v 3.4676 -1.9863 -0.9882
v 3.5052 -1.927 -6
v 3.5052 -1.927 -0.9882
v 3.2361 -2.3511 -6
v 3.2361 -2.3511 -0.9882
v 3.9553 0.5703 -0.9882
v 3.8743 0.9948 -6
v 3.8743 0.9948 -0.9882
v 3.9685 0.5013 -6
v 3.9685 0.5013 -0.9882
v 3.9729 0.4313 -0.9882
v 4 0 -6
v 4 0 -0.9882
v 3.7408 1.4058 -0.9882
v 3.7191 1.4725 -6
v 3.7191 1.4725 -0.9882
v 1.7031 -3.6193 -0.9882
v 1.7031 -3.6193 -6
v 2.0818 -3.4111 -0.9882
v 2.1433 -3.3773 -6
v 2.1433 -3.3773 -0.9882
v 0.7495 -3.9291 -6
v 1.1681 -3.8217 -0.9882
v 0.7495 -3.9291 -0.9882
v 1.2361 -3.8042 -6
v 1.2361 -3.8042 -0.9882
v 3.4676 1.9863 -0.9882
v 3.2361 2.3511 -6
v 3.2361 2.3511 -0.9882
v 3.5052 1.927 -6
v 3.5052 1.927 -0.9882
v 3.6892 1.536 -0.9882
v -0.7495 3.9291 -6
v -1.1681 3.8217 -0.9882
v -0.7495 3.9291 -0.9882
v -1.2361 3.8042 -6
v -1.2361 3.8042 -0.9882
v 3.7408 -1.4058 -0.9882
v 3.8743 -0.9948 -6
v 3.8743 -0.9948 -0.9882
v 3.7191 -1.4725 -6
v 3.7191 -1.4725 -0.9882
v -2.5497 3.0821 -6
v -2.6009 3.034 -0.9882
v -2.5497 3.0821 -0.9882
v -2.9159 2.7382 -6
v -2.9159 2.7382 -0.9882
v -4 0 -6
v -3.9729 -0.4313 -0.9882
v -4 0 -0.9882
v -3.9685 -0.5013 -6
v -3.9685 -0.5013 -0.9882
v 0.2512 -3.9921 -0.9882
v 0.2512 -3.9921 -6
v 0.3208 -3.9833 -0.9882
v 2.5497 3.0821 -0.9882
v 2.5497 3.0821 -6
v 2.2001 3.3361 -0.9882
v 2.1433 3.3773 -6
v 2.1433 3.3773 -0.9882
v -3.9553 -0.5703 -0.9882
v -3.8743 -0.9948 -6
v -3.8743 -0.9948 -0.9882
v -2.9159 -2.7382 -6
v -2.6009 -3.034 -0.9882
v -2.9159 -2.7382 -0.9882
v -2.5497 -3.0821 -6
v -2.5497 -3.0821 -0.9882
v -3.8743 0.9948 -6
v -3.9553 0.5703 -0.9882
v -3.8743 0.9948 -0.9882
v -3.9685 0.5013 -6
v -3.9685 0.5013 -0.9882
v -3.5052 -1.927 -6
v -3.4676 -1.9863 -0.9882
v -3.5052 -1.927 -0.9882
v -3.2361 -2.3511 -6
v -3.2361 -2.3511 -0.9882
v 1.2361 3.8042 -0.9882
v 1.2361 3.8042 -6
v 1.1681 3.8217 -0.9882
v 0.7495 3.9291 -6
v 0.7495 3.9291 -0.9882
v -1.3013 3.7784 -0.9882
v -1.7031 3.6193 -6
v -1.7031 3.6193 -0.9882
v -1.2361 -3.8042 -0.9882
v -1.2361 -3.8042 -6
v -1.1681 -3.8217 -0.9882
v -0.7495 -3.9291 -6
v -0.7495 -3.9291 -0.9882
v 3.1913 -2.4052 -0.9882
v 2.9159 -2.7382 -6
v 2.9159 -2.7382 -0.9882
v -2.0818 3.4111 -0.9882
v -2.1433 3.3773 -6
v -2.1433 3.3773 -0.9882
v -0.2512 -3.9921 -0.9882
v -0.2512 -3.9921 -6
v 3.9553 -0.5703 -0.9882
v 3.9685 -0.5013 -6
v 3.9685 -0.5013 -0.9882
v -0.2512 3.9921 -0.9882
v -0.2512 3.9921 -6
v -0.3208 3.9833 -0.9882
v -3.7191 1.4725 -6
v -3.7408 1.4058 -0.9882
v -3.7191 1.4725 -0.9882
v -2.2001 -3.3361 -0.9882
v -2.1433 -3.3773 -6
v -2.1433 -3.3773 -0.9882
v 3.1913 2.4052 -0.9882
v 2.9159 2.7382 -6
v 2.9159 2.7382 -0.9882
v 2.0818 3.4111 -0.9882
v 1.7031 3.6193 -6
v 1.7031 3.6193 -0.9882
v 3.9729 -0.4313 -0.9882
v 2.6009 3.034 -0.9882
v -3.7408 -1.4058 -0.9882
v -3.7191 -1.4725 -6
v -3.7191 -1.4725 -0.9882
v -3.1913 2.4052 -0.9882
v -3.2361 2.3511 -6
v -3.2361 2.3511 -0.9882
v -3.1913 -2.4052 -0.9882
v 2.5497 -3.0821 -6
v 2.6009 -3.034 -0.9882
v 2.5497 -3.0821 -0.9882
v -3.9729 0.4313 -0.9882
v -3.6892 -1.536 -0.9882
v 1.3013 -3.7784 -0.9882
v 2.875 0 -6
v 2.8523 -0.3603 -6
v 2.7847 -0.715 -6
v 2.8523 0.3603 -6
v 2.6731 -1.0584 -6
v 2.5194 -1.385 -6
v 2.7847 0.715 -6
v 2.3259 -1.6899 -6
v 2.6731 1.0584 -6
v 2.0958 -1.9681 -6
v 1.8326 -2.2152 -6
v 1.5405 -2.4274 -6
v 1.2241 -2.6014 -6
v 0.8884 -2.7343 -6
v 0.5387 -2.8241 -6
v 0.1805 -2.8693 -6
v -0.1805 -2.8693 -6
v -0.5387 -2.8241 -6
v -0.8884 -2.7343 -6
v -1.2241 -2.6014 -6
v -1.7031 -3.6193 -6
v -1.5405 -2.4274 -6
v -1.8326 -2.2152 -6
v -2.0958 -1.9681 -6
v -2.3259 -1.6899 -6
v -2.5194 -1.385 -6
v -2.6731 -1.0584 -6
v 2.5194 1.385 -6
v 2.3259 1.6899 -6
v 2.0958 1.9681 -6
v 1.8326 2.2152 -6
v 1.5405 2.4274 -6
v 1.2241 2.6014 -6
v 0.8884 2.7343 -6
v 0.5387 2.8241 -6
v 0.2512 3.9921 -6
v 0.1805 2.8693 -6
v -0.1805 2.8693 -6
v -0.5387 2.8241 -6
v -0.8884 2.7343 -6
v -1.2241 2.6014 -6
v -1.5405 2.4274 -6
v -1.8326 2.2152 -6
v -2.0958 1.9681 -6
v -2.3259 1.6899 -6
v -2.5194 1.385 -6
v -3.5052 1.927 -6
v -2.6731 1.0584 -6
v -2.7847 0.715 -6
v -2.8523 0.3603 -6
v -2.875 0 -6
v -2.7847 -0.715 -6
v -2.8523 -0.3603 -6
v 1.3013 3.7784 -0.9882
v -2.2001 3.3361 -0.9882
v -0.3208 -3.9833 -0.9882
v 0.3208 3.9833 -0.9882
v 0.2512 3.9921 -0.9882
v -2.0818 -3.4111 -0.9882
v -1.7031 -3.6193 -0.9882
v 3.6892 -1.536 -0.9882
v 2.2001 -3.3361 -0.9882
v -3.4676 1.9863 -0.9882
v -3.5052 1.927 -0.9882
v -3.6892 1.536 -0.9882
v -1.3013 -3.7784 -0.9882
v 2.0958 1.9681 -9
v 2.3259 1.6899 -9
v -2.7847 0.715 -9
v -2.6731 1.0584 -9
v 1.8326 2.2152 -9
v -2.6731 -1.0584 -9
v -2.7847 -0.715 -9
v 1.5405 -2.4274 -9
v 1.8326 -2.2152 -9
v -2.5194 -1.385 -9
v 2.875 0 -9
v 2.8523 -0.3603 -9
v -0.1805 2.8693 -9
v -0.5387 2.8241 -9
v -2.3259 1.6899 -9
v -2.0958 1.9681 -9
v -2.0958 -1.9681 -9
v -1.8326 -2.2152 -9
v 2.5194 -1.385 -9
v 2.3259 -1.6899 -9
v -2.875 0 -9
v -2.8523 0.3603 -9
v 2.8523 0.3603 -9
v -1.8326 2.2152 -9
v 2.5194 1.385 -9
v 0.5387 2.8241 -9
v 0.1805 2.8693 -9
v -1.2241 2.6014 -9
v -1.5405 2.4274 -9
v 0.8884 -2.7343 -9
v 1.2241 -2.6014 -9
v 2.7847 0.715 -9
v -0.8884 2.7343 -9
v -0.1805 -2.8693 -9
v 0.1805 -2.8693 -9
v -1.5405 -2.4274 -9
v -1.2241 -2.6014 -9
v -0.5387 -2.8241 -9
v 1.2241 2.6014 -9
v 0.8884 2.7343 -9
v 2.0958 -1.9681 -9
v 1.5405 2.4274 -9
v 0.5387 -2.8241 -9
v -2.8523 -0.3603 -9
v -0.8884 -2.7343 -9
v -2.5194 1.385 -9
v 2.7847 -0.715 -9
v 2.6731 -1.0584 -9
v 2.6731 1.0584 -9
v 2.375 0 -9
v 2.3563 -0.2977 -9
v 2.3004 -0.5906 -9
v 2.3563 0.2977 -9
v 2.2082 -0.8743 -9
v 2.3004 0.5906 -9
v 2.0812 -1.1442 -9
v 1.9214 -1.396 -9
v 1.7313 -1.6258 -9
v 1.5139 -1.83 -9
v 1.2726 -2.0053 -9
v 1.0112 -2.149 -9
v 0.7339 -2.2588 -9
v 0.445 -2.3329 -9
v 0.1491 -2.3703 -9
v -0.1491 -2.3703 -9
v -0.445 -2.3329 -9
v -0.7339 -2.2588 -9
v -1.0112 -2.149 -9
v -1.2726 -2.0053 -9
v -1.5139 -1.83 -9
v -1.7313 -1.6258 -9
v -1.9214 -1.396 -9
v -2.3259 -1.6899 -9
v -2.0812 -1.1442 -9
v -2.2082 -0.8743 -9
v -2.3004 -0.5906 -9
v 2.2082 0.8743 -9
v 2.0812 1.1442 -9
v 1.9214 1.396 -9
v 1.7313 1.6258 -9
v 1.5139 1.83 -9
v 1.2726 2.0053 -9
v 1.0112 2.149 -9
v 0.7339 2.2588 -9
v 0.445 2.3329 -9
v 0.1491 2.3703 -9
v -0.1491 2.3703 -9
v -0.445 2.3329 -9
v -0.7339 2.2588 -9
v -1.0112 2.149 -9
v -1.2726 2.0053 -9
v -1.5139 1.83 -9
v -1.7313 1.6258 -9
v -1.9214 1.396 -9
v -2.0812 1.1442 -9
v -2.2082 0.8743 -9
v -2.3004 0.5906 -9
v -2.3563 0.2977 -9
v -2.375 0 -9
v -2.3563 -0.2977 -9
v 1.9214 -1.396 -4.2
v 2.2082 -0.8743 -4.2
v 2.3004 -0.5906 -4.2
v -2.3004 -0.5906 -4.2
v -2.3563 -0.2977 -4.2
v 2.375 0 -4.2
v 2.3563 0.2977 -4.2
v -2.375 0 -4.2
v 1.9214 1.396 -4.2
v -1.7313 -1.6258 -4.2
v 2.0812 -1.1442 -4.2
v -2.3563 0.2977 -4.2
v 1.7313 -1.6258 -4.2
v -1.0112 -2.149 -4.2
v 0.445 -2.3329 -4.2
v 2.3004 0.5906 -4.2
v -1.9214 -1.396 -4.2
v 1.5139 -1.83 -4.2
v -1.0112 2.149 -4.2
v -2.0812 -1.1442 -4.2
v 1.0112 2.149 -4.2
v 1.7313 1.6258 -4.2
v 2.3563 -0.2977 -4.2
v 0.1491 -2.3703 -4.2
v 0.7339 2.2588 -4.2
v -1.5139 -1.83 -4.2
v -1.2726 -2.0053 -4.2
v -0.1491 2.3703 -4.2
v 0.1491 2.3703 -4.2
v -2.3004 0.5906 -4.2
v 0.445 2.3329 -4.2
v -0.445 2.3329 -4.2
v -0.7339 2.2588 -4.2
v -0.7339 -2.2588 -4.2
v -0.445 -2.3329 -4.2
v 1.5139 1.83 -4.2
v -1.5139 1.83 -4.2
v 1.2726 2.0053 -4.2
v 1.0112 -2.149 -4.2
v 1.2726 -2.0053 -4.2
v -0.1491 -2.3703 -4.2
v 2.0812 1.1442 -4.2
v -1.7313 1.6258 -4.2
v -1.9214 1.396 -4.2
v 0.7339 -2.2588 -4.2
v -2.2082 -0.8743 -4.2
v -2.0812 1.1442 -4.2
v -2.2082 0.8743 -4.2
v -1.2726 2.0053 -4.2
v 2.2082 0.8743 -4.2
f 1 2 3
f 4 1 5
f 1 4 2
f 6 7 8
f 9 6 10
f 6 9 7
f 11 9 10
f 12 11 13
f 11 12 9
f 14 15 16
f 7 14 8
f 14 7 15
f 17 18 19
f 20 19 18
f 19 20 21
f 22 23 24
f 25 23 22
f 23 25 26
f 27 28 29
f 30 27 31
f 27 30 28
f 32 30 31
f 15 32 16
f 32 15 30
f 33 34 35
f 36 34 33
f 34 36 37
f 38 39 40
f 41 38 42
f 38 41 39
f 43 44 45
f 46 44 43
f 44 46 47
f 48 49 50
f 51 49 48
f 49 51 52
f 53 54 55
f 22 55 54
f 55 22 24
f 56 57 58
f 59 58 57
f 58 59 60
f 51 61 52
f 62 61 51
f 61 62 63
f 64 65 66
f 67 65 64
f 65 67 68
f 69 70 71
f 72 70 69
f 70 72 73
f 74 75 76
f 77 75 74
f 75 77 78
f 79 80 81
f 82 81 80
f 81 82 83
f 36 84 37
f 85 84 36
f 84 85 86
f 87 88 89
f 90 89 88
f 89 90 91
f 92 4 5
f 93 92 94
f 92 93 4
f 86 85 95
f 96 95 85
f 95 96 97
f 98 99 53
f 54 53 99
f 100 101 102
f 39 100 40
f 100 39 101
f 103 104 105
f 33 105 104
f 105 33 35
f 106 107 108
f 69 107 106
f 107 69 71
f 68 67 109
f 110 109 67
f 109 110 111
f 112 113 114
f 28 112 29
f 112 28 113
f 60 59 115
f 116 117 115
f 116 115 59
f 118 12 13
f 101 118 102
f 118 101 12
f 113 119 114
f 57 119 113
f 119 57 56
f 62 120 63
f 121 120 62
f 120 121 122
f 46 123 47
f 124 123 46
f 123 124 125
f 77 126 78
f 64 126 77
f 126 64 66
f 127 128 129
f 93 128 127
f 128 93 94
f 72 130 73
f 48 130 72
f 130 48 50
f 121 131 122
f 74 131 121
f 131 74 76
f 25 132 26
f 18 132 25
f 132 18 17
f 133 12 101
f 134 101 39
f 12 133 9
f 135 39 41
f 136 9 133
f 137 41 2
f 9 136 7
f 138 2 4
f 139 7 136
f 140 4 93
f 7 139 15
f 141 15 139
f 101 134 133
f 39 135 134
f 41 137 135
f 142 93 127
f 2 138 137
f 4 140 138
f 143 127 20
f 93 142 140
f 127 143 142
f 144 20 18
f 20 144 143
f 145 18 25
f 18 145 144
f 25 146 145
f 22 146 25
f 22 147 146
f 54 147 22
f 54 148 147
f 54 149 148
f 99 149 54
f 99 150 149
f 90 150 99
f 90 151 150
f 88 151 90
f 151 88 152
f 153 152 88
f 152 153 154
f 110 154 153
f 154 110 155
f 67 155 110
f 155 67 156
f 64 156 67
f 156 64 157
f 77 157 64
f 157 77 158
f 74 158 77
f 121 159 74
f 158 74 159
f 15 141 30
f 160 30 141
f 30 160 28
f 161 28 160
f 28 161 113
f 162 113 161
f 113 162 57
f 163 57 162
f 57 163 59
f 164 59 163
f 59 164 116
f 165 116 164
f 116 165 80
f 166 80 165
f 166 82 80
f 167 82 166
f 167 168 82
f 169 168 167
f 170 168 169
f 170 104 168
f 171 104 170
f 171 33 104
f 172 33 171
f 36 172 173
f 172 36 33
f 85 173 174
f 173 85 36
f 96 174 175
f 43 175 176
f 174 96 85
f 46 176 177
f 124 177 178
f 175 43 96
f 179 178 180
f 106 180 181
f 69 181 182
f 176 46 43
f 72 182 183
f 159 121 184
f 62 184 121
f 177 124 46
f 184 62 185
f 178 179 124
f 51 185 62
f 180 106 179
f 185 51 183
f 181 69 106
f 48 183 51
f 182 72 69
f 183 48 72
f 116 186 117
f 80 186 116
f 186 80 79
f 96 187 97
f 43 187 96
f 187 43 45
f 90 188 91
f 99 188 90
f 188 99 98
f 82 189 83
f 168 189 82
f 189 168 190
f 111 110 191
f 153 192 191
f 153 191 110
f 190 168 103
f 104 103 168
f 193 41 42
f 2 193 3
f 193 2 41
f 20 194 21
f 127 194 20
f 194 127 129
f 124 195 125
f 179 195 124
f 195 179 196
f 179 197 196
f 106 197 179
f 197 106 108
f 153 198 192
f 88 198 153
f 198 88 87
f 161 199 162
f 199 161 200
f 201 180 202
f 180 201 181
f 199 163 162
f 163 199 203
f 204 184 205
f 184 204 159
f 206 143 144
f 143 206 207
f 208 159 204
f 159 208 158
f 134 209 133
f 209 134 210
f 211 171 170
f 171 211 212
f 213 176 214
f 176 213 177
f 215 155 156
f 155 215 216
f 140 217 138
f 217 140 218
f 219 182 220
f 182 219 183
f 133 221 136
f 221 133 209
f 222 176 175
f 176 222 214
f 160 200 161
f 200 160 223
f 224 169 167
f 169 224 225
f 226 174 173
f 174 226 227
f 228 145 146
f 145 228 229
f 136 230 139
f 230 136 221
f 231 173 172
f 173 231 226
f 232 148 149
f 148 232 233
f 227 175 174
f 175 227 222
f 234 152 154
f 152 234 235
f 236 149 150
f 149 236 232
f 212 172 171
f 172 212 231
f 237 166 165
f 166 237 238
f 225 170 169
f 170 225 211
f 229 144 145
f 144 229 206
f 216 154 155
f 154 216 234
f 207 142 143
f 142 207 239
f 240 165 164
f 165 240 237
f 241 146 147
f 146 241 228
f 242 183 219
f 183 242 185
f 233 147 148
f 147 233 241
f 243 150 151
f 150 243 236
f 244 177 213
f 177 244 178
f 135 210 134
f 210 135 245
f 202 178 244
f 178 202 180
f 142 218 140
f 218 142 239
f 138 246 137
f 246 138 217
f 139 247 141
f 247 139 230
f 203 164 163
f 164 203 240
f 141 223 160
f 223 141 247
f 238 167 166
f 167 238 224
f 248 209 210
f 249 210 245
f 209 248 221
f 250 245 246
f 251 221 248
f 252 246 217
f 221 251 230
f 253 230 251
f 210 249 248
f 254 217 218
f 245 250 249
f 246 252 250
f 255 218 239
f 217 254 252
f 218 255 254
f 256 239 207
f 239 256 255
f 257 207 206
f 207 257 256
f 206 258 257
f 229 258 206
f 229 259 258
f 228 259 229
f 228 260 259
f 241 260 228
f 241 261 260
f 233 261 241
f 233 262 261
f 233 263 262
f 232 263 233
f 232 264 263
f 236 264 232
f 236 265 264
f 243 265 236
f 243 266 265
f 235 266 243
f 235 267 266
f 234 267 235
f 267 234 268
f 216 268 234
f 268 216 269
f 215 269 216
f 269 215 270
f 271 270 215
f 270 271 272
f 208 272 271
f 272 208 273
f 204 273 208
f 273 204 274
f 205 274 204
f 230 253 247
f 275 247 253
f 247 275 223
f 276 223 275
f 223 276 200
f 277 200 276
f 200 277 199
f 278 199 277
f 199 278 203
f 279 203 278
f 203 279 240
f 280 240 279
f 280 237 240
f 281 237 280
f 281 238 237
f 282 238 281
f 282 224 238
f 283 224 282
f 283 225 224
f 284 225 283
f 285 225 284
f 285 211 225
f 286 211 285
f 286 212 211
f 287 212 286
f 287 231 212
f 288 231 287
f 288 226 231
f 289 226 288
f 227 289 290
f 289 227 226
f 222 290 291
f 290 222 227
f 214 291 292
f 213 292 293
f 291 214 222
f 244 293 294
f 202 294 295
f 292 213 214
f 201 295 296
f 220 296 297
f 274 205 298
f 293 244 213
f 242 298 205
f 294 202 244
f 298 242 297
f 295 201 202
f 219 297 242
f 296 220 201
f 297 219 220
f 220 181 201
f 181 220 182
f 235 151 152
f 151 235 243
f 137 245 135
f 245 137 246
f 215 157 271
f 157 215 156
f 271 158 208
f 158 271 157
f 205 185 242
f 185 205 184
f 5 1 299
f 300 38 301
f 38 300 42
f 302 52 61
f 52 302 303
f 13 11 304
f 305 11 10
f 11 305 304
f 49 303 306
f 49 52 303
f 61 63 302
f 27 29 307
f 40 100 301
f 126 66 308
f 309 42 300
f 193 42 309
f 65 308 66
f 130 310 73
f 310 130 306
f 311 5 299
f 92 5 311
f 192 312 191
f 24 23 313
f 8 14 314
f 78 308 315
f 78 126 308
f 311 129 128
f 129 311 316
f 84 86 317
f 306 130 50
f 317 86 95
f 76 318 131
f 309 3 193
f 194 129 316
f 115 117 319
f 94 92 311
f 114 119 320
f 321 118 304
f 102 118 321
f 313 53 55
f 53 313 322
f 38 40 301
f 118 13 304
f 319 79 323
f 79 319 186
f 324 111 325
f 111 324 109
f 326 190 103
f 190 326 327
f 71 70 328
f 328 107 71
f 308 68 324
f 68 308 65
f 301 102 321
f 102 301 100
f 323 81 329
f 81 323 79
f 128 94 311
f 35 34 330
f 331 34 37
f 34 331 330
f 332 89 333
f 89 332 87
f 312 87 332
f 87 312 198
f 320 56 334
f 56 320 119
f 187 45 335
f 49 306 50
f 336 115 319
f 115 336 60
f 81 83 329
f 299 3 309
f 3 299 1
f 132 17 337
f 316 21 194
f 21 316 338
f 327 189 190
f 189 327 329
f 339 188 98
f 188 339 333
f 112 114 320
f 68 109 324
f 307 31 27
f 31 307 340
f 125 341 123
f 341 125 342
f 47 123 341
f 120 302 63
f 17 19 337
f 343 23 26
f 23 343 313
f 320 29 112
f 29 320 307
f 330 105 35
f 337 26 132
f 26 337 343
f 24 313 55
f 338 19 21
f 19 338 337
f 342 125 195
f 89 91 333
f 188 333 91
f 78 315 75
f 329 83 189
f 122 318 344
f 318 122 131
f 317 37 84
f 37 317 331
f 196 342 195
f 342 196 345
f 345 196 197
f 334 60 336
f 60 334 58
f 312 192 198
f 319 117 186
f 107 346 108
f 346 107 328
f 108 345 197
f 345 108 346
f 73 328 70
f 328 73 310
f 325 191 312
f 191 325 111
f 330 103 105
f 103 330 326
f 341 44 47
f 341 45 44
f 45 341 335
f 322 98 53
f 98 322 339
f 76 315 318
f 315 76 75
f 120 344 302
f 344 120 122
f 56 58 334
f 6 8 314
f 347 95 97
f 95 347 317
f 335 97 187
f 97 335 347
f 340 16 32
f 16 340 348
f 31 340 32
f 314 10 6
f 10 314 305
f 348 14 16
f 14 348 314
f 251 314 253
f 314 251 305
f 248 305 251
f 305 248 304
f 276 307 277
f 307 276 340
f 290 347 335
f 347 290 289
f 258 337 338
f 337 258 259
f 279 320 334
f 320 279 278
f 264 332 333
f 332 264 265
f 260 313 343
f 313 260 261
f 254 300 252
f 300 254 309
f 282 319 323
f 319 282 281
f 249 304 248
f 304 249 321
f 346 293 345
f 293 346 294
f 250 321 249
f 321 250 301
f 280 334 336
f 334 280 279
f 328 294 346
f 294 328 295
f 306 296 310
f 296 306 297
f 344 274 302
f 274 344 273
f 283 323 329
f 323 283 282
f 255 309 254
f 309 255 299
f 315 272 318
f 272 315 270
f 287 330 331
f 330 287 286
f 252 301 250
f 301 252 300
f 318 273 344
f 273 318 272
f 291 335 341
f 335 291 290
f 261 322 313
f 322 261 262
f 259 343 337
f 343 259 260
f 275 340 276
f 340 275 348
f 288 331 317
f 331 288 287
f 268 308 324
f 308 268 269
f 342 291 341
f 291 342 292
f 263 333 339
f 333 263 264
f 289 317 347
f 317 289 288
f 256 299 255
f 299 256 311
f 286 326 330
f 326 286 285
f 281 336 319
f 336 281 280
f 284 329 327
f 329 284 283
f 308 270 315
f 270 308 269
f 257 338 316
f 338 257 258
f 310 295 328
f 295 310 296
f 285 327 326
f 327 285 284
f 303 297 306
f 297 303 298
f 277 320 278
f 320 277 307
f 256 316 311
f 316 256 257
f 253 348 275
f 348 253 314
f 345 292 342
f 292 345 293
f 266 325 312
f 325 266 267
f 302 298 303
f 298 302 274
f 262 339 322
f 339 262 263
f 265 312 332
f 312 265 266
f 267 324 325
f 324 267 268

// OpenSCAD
$fn = 50;

difference() {
	union() {
		translate(v = [0, 0, -6.0]) {
			cylinder(h = 9, r = 4.0);
		}
		#translate(v = [0, 0, -9.0]) {
			cylinder(h = 9, r = 2.875);
		}
	}
	union() {
		translate(v = [0, 0, 0]) {
			rotate(a = [0, 0, 0]) {
				difference() {
					union() {
						translate(v = [0, 0, -9.0]) {
							cylinder(h = 9, r = 2.25);
						}
						translate(v = [0, 0, -4.2]) {
							cylinder(h = 4.2, r1 = 2.375, r2 = 4.5);
						}
						translate(v = [0, 0, -9.0]) {
							cylinder(h = 9, r = 2.375);
						}
						translate(v = [0, 0, -9.0]) {
							cylinder(h = 9, r = 2.25);
						}
					}
					union();
				}
			}
		}
		#cylinder(h = 3, r = 5.0);
	}
}
